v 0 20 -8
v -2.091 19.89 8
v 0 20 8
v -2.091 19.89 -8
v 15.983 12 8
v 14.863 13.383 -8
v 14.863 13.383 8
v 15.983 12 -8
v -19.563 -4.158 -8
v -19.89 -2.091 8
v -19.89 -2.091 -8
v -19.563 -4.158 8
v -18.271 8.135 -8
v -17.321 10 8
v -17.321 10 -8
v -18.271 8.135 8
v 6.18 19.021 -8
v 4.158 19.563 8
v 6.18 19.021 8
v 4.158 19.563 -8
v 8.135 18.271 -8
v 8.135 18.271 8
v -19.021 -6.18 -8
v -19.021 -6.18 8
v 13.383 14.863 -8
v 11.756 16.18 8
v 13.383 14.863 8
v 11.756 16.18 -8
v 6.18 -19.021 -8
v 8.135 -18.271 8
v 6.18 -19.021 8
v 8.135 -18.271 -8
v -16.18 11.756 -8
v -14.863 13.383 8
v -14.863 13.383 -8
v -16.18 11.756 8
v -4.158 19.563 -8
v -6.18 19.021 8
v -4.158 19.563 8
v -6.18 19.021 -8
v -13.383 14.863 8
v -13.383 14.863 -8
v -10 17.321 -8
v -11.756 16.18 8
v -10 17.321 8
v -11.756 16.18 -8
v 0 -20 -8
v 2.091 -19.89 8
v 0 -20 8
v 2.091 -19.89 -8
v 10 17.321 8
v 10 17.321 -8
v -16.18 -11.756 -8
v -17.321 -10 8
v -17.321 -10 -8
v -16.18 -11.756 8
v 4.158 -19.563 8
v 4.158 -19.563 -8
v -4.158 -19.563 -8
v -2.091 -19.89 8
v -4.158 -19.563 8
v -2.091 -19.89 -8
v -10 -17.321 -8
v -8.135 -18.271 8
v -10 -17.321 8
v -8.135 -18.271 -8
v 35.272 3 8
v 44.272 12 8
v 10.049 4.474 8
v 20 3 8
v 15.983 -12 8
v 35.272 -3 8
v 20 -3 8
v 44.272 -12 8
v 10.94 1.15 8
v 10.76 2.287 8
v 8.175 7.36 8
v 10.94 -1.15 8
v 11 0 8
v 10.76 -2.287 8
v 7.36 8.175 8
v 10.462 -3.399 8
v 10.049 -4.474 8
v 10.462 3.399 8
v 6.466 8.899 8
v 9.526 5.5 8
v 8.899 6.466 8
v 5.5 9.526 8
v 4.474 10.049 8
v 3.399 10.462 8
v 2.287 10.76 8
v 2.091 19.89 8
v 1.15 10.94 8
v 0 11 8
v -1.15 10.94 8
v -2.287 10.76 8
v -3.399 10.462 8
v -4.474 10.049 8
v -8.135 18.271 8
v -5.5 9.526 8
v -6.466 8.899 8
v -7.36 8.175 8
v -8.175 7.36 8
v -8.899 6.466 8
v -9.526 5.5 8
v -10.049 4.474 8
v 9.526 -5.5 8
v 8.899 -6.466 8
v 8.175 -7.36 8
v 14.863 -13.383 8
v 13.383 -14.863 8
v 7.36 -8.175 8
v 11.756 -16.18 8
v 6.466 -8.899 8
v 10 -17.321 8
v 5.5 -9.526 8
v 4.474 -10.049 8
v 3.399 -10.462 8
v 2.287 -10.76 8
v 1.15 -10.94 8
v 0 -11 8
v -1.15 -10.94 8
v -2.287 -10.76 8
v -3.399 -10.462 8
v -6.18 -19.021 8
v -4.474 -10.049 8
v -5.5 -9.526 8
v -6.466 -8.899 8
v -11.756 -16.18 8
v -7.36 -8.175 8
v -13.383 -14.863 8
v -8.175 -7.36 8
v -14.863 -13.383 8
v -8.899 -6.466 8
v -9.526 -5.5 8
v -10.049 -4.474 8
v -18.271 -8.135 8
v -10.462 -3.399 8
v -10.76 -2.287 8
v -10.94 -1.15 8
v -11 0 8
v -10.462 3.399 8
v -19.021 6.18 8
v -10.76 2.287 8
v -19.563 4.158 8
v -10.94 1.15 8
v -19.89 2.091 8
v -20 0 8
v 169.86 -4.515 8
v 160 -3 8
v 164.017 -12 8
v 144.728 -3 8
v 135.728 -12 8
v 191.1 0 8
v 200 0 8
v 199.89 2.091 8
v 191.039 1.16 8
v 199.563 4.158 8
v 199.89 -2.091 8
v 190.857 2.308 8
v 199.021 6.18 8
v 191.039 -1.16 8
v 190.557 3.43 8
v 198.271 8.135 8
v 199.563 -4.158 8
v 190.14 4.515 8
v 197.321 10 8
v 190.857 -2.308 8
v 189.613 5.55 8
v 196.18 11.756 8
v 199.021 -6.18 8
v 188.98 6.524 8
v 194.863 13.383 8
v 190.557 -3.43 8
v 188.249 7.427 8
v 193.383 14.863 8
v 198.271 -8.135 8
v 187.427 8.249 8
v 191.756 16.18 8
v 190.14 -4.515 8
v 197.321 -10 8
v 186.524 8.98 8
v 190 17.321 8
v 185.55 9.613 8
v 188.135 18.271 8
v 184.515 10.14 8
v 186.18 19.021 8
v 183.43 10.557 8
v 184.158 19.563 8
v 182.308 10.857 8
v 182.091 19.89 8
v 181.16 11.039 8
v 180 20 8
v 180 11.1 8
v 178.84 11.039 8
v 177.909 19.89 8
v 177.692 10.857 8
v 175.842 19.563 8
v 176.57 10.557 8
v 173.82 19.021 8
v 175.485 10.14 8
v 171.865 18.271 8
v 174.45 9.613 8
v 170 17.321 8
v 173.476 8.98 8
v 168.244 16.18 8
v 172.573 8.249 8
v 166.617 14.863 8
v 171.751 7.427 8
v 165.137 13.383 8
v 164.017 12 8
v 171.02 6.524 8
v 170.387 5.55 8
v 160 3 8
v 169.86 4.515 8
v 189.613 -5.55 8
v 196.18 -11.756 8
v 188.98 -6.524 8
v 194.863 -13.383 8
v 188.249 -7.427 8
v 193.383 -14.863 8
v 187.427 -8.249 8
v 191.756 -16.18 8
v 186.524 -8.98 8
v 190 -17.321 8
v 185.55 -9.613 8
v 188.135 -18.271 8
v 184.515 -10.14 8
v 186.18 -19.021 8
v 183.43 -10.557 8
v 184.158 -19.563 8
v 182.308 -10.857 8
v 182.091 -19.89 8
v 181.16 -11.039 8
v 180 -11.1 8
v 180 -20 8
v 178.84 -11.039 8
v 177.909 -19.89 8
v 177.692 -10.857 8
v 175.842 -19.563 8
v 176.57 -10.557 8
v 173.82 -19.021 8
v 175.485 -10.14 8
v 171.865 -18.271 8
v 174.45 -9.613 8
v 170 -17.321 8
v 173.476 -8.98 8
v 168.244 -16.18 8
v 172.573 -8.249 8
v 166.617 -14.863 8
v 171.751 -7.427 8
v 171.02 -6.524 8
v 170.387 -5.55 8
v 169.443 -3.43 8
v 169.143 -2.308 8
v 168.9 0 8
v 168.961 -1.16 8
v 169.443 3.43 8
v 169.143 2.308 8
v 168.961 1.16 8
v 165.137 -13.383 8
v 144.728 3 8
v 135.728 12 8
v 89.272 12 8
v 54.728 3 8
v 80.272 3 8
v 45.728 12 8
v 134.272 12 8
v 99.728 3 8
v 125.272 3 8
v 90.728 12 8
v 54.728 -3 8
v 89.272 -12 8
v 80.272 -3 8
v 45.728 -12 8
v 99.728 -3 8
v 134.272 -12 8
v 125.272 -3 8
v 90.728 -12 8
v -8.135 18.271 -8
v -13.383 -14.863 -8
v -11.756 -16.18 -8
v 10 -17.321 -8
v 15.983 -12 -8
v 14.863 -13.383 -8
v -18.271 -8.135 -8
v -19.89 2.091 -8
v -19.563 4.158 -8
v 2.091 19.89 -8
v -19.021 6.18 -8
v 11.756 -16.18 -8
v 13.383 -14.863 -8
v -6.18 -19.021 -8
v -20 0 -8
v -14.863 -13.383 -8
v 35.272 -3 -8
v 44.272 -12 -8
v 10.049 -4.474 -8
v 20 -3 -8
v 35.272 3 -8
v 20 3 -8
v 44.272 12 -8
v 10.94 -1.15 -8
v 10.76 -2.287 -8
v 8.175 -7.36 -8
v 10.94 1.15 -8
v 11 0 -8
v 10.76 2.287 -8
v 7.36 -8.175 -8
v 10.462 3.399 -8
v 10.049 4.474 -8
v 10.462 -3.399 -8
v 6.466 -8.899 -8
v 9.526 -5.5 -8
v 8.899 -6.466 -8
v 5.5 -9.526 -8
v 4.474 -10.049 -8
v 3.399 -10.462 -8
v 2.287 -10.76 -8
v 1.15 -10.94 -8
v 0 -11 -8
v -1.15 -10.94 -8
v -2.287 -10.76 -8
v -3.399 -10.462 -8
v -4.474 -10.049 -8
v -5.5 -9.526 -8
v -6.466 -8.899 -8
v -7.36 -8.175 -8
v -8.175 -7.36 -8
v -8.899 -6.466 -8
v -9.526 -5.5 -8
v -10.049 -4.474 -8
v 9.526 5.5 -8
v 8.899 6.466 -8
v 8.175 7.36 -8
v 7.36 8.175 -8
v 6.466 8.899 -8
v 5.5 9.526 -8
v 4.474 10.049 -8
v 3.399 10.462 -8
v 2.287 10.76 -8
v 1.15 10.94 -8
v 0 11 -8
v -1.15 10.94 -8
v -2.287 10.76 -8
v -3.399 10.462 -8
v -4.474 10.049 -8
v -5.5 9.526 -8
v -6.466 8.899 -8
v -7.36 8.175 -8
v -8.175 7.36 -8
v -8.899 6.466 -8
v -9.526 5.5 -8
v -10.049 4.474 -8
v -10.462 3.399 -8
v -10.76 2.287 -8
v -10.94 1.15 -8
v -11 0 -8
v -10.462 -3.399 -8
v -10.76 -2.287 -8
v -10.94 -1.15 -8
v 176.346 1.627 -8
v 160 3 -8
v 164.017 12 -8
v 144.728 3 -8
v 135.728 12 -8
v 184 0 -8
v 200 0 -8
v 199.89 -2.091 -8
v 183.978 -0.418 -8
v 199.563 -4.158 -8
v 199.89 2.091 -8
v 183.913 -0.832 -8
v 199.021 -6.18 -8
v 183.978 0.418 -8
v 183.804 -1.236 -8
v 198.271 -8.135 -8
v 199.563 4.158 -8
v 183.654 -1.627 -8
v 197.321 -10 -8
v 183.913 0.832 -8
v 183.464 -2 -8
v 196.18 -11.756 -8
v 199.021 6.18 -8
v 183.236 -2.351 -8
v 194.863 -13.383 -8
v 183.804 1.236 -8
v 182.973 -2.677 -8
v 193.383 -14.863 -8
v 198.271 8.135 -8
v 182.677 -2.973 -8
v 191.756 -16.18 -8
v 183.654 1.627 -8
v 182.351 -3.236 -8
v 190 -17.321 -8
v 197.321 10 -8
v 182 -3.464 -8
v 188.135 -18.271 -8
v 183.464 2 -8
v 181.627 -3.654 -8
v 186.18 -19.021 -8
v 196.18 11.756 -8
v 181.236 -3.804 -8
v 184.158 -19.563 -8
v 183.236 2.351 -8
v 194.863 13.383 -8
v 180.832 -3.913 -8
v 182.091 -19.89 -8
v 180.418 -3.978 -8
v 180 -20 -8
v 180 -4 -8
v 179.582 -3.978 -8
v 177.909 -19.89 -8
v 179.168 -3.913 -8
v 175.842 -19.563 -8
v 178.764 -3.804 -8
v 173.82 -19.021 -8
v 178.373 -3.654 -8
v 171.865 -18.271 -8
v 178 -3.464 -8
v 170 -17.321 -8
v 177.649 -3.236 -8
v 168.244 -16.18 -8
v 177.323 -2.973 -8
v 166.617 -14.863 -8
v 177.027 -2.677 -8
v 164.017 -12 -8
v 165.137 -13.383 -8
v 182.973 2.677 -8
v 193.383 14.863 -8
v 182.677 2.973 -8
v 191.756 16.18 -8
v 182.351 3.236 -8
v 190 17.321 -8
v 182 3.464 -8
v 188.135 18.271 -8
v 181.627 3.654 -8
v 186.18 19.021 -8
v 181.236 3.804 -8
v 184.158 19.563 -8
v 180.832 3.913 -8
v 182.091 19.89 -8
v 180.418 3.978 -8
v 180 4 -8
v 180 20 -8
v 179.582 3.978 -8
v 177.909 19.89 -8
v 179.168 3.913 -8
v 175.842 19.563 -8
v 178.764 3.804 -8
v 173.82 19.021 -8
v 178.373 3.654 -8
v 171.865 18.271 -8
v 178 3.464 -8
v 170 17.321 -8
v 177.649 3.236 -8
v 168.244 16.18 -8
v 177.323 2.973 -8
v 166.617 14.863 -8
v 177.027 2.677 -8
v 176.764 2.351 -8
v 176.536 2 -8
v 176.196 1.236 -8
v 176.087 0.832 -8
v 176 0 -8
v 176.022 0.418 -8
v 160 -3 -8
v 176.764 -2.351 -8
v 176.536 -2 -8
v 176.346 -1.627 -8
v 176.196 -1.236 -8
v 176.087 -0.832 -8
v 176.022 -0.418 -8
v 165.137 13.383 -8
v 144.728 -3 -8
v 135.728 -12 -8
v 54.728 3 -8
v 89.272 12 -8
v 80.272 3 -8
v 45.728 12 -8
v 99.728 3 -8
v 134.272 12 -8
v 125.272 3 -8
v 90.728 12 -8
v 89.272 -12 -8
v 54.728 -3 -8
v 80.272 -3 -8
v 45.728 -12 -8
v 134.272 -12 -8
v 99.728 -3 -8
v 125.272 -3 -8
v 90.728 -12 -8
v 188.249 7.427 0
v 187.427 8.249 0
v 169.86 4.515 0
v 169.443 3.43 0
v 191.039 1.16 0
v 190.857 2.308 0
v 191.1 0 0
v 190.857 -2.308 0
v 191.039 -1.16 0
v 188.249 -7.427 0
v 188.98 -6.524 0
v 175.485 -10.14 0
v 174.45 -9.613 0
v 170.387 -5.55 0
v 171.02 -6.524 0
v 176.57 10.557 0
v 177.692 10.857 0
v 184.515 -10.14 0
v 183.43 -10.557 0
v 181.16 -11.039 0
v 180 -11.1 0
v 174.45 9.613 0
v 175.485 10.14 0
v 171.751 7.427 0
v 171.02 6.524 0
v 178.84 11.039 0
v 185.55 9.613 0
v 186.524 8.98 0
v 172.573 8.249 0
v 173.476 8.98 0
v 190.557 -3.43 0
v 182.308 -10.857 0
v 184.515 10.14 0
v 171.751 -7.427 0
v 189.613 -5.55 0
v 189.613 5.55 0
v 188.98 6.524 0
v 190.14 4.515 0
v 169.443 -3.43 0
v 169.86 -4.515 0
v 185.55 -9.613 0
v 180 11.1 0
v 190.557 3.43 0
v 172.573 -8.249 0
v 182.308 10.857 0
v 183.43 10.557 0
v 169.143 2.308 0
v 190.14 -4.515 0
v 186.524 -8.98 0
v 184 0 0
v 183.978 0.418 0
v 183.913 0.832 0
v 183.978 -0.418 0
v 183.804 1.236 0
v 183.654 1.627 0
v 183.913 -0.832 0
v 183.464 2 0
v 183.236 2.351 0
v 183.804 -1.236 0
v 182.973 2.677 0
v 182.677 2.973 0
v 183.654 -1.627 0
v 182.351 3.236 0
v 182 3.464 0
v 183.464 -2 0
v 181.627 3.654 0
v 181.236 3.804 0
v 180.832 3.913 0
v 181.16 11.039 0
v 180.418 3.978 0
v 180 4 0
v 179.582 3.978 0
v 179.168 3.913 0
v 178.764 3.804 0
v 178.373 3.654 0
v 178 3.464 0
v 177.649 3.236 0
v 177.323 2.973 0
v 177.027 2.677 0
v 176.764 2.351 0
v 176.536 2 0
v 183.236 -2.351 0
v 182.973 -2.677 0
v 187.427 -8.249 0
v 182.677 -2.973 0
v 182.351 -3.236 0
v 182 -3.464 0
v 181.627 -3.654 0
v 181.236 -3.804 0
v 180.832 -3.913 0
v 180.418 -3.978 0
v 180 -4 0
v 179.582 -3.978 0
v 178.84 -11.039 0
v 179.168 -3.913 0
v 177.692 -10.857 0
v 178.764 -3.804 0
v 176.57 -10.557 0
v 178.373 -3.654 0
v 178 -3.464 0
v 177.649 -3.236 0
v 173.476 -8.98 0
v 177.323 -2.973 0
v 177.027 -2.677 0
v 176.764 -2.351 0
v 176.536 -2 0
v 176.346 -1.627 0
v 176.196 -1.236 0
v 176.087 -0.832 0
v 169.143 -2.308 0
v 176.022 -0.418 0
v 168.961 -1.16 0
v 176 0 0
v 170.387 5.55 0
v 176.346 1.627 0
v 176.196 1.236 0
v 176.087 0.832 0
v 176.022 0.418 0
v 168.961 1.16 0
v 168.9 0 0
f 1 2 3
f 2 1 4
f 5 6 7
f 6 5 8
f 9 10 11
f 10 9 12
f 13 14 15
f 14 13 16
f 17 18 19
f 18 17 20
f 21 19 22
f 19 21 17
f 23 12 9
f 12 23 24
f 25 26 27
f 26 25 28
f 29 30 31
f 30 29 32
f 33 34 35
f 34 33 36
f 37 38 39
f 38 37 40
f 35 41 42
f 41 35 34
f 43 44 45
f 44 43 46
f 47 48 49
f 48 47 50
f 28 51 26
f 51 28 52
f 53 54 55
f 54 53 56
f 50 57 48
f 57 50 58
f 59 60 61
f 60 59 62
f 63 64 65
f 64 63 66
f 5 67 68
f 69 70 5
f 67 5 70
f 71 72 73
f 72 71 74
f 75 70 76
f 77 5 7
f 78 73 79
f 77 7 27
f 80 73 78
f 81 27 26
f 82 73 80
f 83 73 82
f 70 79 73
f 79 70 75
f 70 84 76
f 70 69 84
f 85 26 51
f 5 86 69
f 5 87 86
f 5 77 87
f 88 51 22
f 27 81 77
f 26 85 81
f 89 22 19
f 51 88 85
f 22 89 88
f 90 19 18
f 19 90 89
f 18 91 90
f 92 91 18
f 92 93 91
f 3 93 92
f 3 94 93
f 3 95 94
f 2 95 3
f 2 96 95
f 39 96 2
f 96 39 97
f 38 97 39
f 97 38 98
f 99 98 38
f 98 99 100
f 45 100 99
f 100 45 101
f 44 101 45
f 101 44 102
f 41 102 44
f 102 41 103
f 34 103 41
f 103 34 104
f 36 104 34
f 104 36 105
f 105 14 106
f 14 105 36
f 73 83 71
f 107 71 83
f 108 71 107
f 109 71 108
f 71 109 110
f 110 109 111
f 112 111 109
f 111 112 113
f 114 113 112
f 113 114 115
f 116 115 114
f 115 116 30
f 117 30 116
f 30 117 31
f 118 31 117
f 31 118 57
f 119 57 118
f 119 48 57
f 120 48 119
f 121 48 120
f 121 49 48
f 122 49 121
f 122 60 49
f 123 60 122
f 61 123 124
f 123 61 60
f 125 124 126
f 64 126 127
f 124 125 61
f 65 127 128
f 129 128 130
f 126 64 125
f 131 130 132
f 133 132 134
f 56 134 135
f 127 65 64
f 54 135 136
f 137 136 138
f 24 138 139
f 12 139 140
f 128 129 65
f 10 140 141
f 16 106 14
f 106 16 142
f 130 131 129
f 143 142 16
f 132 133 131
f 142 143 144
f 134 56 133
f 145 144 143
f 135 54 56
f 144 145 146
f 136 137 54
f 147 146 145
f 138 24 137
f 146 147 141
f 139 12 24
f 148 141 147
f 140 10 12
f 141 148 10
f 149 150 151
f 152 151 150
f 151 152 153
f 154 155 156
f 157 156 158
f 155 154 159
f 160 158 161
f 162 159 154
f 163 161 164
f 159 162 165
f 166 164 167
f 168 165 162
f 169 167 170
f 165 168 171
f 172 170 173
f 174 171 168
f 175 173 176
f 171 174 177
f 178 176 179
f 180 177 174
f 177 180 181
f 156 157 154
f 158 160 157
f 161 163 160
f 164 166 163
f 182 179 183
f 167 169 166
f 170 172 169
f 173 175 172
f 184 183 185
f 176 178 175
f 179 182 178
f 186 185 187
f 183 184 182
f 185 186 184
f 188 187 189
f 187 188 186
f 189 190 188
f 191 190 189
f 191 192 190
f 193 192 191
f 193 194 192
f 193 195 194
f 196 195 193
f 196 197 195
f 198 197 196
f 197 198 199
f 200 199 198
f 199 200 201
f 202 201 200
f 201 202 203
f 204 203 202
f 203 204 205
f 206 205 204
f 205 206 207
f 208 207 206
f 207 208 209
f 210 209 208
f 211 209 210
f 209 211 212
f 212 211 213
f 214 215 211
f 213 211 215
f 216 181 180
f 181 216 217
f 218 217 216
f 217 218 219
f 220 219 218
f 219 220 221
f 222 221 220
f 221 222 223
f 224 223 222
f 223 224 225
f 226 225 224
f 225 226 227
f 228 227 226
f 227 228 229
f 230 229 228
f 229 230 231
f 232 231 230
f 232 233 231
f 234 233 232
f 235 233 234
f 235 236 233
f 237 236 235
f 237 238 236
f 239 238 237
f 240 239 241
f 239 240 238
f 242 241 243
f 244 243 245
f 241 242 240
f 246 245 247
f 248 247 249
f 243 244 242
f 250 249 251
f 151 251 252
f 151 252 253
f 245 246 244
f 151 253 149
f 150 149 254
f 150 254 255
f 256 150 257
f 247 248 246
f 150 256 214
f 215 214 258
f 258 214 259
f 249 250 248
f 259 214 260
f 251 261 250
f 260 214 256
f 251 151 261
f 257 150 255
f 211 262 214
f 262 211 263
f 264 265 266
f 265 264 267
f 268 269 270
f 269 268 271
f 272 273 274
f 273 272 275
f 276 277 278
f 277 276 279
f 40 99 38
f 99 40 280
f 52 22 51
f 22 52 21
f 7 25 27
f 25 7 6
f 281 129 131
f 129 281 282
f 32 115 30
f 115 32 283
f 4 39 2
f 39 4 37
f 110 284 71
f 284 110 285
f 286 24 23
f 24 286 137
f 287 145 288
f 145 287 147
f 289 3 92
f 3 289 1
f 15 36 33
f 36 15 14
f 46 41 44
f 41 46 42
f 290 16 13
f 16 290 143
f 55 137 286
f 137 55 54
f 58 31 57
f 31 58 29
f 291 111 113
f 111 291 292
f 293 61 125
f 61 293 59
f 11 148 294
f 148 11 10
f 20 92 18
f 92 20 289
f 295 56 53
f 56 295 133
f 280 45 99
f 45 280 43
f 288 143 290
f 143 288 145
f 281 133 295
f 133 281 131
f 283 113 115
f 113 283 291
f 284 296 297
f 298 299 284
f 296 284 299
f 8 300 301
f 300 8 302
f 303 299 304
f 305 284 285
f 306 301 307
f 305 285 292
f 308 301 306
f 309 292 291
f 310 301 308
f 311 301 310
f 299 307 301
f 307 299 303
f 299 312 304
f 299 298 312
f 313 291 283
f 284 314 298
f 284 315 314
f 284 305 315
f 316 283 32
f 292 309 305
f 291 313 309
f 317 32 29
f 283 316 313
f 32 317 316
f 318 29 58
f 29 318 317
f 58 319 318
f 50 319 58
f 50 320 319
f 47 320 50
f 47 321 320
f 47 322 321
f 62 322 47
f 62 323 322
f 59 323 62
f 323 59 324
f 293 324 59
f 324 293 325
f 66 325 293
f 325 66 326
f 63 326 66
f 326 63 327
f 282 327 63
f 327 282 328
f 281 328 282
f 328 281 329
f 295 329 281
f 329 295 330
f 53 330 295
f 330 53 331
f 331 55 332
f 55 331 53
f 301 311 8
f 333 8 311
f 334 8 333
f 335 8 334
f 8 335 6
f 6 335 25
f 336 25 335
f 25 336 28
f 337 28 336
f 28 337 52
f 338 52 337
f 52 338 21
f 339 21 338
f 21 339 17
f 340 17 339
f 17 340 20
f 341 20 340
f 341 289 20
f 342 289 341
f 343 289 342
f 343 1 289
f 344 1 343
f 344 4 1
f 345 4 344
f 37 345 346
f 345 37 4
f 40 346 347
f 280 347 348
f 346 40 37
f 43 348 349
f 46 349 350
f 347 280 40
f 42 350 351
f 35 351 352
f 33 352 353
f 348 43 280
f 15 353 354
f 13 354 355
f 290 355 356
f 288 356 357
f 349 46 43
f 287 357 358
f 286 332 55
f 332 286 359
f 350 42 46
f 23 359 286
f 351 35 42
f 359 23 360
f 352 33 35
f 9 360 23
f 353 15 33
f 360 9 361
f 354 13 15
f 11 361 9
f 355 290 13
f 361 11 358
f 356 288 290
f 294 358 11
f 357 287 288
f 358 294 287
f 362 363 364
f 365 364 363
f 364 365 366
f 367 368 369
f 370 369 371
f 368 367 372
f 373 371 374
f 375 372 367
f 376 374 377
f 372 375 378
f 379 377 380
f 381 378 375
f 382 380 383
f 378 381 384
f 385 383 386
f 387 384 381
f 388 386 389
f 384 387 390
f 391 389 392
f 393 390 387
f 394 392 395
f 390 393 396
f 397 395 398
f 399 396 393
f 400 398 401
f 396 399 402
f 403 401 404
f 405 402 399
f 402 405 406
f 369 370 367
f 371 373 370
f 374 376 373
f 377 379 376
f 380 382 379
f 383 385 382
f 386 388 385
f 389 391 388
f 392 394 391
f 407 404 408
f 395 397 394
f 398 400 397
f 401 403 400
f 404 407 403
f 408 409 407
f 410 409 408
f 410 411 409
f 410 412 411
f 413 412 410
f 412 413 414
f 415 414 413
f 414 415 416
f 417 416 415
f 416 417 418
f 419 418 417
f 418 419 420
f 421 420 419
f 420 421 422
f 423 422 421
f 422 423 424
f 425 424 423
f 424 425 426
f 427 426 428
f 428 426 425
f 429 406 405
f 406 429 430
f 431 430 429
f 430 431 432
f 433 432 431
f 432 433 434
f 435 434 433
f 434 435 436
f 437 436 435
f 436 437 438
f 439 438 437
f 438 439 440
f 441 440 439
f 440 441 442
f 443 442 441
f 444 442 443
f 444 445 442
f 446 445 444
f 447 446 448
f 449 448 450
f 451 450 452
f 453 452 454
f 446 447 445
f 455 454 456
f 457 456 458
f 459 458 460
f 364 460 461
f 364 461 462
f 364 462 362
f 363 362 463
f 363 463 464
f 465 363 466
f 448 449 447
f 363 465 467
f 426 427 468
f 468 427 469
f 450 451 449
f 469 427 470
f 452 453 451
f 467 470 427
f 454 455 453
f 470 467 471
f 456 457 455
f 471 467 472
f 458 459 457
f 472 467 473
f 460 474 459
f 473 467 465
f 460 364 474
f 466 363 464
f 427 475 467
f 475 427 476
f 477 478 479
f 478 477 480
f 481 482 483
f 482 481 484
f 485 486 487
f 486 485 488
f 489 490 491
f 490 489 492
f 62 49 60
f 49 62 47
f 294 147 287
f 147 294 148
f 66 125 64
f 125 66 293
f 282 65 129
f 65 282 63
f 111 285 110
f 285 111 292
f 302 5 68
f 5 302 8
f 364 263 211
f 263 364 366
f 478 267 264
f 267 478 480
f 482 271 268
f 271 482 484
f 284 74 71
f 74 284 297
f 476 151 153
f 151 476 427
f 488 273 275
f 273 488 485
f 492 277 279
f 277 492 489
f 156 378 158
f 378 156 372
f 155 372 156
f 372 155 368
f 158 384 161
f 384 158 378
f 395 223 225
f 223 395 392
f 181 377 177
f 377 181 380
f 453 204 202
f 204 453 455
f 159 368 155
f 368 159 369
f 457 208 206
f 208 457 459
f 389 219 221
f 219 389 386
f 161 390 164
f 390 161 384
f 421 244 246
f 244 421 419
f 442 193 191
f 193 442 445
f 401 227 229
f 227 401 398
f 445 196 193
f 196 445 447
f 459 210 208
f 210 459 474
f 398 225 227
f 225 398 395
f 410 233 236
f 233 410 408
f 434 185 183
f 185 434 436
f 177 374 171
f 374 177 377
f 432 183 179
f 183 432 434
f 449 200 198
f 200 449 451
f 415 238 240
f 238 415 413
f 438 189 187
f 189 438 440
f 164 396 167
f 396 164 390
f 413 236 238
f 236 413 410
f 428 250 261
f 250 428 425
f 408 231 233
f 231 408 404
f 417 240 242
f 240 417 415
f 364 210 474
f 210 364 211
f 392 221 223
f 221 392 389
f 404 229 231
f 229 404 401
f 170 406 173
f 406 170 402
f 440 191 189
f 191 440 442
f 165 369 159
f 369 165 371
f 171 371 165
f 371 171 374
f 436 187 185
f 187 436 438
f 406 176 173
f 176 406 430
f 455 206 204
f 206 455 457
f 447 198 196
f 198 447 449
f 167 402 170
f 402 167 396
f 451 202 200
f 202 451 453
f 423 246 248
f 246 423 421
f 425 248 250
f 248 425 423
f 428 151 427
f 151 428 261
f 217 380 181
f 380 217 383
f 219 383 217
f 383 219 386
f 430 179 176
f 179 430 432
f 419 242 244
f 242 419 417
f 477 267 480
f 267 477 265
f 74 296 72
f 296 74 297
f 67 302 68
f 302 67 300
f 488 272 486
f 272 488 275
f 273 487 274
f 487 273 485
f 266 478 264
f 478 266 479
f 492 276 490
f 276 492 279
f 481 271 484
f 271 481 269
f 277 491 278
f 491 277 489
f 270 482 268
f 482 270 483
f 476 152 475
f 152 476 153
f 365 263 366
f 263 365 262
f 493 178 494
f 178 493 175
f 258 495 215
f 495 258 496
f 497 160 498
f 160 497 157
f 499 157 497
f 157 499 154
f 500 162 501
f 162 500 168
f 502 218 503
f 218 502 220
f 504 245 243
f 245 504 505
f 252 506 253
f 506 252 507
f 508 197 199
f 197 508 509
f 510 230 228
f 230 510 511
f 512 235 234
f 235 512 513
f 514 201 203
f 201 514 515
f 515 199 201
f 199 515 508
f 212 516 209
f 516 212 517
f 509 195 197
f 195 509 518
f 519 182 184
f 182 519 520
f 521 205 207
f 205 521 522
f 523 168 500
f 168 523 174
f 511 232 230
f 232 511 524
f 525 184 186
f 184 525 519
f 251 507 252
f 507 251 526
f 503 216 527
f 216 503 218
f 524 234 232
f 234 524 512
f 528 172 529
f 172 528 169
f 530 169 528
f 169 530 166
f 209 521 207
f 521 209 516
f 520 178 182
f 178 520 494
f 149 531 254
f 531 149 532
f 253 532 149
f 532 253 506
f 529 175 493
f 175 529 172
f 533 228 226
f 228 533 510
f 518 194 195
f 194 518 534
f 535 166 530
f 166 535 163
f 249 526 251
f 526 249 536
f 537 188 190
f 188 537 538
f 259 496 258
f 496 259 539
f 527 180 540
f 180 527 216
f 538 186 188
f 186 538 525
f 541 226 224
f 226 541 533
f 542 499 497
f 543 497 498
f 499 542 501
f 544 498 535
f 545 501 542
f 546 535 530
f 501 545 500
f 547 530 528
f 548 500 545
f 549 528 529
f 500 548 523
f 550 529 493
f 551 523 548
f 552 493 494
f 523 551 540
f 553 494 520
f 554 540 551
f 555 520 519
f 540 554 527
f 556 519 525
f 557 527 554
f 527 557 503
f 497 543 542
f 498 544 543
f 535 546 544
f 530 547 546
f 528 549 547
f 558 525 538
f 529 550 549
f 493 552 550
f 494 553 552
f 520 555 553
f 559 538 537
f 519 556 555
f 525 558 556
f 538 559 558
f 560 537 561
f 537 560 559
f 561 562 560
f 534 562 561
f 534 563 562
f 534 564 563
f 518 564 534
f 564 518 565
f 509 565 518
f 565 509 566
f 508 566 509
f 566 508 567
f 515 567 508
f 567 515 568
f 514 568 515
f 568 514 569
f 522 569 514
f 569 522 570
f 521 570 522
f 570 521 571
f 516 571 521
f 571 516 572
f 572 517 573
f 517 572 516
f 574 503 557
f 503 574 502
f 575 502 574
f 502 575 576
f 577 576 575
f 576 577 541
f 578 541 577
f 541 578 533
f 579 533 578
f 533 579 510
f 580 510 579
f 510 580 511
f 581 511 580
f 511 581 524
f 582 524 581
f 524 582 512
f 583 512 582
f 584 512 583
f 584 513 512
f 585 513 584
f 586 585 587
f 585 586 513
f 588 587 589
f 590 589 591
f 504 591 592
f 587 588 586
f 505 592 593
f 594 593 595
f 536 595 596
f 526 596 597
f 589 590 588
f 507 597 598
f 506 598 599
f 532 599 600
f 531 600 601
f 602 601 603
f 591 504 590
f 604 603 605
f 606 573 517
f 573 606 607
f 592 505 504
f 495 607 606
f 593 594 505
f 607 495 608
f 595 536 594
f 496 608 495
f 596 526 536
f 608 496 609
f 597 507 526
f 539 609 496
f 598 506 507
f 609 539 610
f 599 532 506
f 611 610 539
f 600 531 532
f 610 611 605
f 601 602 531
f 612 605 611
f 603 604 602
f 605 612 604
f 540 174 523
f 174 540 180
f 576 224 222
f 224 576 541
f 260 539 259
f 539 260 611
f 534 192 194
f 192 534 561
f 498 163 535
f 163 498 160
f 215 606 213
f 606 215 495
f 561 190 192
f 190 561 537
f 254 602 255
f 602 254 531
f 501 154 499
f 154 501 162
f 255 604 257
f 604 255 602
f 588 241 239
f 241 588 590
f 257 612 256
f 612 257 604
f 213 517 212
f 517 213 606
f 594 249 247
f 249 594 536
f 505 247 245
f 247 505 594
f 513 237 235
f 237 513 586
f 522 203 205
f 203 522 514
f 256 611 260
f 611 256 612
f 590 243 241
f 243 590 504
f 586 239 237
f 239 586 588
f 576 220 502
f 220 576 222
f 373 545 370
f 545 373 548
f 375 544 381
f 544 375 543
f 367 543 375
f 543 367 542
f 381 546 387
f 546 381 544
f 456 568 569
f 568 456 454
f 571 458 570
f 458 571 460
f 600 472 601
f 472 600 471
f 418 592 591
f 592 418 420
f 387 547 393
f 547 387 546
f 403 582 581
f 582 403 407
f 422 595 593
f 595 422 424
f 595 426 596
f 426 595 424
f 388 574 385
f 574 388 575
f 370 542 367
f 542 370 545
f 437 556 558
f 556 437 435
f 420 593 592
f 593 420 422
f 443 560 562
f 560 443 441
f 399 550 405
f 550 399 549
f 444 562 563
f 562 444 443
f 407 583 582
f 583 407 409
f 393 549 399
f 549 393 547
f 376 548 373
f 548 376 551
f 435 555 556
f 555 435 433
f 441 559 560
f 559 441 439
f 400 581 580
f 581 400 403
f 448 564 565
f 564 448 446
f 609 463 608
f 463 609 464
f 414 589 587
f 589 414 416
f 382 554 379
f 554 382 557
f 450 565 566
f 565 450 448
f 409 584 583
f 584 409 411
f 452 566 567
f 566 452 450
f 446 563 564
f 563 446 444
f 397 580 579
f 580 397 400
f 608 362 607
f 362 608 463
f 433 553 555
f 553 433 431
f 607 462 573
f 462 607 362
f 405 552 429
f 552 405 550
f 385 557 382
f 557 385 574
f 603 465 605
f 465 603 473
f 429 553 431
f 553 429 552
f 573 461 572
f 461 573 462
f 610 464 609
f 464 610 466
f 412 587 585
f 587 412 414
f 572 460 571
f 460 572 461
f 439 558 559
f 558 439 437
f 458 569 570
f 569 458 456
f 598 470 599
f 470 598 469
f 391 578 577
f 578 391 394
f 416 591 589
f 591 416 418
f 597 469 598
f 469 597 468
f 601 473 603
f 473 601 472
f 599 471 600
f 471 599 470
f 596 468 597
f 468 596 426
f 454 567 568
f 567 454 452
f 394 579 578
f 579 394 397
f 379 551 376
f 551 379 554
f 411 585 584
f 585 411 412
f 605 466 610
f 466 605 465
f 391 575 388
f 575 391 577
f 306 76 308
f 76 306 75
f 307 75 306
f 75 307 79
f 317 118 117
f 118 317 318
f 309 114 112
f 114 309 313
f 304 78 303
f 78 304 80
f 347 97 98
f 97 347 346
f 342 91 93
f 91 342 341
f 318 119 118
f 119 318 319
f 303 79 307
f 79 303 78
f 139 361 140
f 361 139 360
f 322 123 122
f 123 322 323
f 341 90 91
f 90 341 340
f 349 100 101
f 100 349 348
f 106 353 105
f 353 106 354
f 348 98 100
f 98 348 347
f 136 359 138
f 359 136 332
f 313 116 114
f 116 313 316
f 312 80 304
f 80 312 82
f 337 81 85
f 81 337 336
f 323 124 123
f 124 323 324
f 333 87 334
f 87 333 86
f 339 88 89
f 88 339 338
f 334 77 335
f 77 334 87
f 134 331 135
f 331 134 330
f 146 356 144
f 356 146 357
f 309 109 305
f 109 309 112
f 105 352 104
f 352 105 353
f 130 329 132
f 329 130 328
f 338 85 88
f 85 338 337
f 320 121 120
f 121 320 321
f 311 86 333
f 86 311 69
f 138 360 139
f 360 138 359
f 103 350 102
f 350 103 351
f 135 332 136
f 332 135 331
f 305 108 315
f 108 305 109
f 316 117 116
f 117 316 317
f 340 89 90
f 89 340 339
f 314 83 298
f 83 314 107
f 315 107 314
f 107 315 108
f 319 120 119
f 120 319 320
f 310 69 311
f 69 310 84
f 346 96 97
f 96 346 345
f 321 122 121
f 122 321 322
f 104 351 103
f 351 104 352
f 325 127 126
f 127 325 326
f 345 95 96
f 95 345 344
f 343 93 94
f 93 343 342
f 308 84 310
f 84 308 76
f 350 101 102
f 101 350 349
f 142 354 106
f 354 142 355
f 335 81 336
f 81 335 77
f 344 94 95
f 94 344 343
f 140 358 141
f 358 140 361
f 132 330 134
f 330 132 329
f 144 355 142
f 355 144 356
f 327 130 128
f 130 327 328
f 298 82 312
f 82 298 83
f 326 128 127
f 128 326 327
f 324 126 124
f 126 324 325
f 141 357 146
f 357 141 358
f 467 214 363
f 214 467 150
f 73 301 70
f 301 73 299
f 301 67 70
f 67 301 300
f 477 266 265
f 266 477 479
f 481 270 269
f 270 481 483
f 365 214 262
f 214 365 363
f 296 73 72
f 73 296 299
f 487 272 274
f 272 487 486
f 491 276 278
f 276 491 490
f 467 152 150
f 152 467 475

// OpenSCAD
// file: parameters.scad
// Bhujaha (भुजः) — Global CAD Parameters
// All units in millimeters (mm)

$fn = 60; // Curve resolution

// Joint Link Lengths
L_BASE_HEIGHT     = 65.0;   // Ground to Shoulder joint axis
L_SHOULDER_LINK   = 180.0;  // Shoulder to Elbow axis
L_FOREARM_LINK    = 180.0;  // Elbow to Wrist/Gripper mount
L_GRIPPER_REACH   = 60.0;   // Gripper reach

// Hardware Dimensions (Standard Off-The-Shelf)
BEARING_608_OD    = 22.2;   // 608RS outer diameter (with tolerance)
BEARING_608_ID    = 8.0;    // 608RS inner bore
BEARING_608_WIDTH = 7.0;    // 608RS thickness

// Fasteners
M3_HOLE           = 3.4;    // Clearance for M3 screw
M3_NUT_HEX        = 6.2;    // M3 hex nut slot width
M4_HOLE           = 4.4;    // Clearance for M4 screw
M4_NUT_HEX        = 7.8;    // M4 hex nut slot width

// Serial Bus Servo Specs (Feetech STS3215 / SCS15 standard envelope)
SERVO_LENGTH      = 45.2;
SERVO_WIDTH       = 24.7;
SERVO_HEIGHT      = 35.0;
SERVO_HORN_RADIUS = 10.0;
SERVO_MOUNT_SPACING_X = 48.5;
SERVO_MOUNT_SPACING_Y = 10.0;

// Wall Thickness & Tolerances
WALL_THICKNESS    = 4.0;
TOLERANCE         = 0.3;    // 3D printer clearance
// main file
// Bhujaha (भुजः) — Shoulder Link (Link 1: Joint 2 to Joint 3)
include <parameters.scad>;

module shoulder_link() {
    difference() {
        union() {
            // Joint 2 bottom hub
            cylinder(r=20, h=16, center=true);

            // Arm truss beam (connecting Joint 2 to Joint 3)
            translate([L_SHOULDER_LINK / 2, 0, 0])
                cube([L_SHOULDER_LINK, 24, 16], center=true);

            // Joint 3 top hub
            translate([L_SHOULDER_LINK, 0, 0])
                cylinder(r=20, h=16, center=true);
        }

        // Weight reduction cutouts along the beam
        for (i = [1 : 3]) {
            translate([i * (L_SHOULDER_LINK / 4), 0, 0])
                rotate([0, 0, 45])
                    cube([18, 18, 20], center=true);
        }

        // Joint 2 servo horn mounting bore
        cylinder(r=SERVO_HORN_RADIUS + 1, h=18, center=true);
        for (a = [0 : 90 : 270]) {
            rotate([0, 0, a])
                translate([SERVO_HORN_RADIUS - 2, 0, 0])
                    cylinder(r=M3_HOLE / 2, h=20, center=true);
        }

        // Joint 3 servo mount cutout & bearing seat
        translate([L_SHOULDER_LINK, 0, 0]) {
            cylinder(r=BEARING_608_OD / 2, h=BEARING_608_WIDTH + 1, center=false);
            cylinder(r=BEARING_608_ID / 2, h=20, center=true);
        }

        // Cable routing slots
        translate([L_SHOULDER_LINK / 2, 0, 0])
            cube([L_SHOULDER_LINK - 40, 6, 20], center=true);
    }
}

shoulder_link();
